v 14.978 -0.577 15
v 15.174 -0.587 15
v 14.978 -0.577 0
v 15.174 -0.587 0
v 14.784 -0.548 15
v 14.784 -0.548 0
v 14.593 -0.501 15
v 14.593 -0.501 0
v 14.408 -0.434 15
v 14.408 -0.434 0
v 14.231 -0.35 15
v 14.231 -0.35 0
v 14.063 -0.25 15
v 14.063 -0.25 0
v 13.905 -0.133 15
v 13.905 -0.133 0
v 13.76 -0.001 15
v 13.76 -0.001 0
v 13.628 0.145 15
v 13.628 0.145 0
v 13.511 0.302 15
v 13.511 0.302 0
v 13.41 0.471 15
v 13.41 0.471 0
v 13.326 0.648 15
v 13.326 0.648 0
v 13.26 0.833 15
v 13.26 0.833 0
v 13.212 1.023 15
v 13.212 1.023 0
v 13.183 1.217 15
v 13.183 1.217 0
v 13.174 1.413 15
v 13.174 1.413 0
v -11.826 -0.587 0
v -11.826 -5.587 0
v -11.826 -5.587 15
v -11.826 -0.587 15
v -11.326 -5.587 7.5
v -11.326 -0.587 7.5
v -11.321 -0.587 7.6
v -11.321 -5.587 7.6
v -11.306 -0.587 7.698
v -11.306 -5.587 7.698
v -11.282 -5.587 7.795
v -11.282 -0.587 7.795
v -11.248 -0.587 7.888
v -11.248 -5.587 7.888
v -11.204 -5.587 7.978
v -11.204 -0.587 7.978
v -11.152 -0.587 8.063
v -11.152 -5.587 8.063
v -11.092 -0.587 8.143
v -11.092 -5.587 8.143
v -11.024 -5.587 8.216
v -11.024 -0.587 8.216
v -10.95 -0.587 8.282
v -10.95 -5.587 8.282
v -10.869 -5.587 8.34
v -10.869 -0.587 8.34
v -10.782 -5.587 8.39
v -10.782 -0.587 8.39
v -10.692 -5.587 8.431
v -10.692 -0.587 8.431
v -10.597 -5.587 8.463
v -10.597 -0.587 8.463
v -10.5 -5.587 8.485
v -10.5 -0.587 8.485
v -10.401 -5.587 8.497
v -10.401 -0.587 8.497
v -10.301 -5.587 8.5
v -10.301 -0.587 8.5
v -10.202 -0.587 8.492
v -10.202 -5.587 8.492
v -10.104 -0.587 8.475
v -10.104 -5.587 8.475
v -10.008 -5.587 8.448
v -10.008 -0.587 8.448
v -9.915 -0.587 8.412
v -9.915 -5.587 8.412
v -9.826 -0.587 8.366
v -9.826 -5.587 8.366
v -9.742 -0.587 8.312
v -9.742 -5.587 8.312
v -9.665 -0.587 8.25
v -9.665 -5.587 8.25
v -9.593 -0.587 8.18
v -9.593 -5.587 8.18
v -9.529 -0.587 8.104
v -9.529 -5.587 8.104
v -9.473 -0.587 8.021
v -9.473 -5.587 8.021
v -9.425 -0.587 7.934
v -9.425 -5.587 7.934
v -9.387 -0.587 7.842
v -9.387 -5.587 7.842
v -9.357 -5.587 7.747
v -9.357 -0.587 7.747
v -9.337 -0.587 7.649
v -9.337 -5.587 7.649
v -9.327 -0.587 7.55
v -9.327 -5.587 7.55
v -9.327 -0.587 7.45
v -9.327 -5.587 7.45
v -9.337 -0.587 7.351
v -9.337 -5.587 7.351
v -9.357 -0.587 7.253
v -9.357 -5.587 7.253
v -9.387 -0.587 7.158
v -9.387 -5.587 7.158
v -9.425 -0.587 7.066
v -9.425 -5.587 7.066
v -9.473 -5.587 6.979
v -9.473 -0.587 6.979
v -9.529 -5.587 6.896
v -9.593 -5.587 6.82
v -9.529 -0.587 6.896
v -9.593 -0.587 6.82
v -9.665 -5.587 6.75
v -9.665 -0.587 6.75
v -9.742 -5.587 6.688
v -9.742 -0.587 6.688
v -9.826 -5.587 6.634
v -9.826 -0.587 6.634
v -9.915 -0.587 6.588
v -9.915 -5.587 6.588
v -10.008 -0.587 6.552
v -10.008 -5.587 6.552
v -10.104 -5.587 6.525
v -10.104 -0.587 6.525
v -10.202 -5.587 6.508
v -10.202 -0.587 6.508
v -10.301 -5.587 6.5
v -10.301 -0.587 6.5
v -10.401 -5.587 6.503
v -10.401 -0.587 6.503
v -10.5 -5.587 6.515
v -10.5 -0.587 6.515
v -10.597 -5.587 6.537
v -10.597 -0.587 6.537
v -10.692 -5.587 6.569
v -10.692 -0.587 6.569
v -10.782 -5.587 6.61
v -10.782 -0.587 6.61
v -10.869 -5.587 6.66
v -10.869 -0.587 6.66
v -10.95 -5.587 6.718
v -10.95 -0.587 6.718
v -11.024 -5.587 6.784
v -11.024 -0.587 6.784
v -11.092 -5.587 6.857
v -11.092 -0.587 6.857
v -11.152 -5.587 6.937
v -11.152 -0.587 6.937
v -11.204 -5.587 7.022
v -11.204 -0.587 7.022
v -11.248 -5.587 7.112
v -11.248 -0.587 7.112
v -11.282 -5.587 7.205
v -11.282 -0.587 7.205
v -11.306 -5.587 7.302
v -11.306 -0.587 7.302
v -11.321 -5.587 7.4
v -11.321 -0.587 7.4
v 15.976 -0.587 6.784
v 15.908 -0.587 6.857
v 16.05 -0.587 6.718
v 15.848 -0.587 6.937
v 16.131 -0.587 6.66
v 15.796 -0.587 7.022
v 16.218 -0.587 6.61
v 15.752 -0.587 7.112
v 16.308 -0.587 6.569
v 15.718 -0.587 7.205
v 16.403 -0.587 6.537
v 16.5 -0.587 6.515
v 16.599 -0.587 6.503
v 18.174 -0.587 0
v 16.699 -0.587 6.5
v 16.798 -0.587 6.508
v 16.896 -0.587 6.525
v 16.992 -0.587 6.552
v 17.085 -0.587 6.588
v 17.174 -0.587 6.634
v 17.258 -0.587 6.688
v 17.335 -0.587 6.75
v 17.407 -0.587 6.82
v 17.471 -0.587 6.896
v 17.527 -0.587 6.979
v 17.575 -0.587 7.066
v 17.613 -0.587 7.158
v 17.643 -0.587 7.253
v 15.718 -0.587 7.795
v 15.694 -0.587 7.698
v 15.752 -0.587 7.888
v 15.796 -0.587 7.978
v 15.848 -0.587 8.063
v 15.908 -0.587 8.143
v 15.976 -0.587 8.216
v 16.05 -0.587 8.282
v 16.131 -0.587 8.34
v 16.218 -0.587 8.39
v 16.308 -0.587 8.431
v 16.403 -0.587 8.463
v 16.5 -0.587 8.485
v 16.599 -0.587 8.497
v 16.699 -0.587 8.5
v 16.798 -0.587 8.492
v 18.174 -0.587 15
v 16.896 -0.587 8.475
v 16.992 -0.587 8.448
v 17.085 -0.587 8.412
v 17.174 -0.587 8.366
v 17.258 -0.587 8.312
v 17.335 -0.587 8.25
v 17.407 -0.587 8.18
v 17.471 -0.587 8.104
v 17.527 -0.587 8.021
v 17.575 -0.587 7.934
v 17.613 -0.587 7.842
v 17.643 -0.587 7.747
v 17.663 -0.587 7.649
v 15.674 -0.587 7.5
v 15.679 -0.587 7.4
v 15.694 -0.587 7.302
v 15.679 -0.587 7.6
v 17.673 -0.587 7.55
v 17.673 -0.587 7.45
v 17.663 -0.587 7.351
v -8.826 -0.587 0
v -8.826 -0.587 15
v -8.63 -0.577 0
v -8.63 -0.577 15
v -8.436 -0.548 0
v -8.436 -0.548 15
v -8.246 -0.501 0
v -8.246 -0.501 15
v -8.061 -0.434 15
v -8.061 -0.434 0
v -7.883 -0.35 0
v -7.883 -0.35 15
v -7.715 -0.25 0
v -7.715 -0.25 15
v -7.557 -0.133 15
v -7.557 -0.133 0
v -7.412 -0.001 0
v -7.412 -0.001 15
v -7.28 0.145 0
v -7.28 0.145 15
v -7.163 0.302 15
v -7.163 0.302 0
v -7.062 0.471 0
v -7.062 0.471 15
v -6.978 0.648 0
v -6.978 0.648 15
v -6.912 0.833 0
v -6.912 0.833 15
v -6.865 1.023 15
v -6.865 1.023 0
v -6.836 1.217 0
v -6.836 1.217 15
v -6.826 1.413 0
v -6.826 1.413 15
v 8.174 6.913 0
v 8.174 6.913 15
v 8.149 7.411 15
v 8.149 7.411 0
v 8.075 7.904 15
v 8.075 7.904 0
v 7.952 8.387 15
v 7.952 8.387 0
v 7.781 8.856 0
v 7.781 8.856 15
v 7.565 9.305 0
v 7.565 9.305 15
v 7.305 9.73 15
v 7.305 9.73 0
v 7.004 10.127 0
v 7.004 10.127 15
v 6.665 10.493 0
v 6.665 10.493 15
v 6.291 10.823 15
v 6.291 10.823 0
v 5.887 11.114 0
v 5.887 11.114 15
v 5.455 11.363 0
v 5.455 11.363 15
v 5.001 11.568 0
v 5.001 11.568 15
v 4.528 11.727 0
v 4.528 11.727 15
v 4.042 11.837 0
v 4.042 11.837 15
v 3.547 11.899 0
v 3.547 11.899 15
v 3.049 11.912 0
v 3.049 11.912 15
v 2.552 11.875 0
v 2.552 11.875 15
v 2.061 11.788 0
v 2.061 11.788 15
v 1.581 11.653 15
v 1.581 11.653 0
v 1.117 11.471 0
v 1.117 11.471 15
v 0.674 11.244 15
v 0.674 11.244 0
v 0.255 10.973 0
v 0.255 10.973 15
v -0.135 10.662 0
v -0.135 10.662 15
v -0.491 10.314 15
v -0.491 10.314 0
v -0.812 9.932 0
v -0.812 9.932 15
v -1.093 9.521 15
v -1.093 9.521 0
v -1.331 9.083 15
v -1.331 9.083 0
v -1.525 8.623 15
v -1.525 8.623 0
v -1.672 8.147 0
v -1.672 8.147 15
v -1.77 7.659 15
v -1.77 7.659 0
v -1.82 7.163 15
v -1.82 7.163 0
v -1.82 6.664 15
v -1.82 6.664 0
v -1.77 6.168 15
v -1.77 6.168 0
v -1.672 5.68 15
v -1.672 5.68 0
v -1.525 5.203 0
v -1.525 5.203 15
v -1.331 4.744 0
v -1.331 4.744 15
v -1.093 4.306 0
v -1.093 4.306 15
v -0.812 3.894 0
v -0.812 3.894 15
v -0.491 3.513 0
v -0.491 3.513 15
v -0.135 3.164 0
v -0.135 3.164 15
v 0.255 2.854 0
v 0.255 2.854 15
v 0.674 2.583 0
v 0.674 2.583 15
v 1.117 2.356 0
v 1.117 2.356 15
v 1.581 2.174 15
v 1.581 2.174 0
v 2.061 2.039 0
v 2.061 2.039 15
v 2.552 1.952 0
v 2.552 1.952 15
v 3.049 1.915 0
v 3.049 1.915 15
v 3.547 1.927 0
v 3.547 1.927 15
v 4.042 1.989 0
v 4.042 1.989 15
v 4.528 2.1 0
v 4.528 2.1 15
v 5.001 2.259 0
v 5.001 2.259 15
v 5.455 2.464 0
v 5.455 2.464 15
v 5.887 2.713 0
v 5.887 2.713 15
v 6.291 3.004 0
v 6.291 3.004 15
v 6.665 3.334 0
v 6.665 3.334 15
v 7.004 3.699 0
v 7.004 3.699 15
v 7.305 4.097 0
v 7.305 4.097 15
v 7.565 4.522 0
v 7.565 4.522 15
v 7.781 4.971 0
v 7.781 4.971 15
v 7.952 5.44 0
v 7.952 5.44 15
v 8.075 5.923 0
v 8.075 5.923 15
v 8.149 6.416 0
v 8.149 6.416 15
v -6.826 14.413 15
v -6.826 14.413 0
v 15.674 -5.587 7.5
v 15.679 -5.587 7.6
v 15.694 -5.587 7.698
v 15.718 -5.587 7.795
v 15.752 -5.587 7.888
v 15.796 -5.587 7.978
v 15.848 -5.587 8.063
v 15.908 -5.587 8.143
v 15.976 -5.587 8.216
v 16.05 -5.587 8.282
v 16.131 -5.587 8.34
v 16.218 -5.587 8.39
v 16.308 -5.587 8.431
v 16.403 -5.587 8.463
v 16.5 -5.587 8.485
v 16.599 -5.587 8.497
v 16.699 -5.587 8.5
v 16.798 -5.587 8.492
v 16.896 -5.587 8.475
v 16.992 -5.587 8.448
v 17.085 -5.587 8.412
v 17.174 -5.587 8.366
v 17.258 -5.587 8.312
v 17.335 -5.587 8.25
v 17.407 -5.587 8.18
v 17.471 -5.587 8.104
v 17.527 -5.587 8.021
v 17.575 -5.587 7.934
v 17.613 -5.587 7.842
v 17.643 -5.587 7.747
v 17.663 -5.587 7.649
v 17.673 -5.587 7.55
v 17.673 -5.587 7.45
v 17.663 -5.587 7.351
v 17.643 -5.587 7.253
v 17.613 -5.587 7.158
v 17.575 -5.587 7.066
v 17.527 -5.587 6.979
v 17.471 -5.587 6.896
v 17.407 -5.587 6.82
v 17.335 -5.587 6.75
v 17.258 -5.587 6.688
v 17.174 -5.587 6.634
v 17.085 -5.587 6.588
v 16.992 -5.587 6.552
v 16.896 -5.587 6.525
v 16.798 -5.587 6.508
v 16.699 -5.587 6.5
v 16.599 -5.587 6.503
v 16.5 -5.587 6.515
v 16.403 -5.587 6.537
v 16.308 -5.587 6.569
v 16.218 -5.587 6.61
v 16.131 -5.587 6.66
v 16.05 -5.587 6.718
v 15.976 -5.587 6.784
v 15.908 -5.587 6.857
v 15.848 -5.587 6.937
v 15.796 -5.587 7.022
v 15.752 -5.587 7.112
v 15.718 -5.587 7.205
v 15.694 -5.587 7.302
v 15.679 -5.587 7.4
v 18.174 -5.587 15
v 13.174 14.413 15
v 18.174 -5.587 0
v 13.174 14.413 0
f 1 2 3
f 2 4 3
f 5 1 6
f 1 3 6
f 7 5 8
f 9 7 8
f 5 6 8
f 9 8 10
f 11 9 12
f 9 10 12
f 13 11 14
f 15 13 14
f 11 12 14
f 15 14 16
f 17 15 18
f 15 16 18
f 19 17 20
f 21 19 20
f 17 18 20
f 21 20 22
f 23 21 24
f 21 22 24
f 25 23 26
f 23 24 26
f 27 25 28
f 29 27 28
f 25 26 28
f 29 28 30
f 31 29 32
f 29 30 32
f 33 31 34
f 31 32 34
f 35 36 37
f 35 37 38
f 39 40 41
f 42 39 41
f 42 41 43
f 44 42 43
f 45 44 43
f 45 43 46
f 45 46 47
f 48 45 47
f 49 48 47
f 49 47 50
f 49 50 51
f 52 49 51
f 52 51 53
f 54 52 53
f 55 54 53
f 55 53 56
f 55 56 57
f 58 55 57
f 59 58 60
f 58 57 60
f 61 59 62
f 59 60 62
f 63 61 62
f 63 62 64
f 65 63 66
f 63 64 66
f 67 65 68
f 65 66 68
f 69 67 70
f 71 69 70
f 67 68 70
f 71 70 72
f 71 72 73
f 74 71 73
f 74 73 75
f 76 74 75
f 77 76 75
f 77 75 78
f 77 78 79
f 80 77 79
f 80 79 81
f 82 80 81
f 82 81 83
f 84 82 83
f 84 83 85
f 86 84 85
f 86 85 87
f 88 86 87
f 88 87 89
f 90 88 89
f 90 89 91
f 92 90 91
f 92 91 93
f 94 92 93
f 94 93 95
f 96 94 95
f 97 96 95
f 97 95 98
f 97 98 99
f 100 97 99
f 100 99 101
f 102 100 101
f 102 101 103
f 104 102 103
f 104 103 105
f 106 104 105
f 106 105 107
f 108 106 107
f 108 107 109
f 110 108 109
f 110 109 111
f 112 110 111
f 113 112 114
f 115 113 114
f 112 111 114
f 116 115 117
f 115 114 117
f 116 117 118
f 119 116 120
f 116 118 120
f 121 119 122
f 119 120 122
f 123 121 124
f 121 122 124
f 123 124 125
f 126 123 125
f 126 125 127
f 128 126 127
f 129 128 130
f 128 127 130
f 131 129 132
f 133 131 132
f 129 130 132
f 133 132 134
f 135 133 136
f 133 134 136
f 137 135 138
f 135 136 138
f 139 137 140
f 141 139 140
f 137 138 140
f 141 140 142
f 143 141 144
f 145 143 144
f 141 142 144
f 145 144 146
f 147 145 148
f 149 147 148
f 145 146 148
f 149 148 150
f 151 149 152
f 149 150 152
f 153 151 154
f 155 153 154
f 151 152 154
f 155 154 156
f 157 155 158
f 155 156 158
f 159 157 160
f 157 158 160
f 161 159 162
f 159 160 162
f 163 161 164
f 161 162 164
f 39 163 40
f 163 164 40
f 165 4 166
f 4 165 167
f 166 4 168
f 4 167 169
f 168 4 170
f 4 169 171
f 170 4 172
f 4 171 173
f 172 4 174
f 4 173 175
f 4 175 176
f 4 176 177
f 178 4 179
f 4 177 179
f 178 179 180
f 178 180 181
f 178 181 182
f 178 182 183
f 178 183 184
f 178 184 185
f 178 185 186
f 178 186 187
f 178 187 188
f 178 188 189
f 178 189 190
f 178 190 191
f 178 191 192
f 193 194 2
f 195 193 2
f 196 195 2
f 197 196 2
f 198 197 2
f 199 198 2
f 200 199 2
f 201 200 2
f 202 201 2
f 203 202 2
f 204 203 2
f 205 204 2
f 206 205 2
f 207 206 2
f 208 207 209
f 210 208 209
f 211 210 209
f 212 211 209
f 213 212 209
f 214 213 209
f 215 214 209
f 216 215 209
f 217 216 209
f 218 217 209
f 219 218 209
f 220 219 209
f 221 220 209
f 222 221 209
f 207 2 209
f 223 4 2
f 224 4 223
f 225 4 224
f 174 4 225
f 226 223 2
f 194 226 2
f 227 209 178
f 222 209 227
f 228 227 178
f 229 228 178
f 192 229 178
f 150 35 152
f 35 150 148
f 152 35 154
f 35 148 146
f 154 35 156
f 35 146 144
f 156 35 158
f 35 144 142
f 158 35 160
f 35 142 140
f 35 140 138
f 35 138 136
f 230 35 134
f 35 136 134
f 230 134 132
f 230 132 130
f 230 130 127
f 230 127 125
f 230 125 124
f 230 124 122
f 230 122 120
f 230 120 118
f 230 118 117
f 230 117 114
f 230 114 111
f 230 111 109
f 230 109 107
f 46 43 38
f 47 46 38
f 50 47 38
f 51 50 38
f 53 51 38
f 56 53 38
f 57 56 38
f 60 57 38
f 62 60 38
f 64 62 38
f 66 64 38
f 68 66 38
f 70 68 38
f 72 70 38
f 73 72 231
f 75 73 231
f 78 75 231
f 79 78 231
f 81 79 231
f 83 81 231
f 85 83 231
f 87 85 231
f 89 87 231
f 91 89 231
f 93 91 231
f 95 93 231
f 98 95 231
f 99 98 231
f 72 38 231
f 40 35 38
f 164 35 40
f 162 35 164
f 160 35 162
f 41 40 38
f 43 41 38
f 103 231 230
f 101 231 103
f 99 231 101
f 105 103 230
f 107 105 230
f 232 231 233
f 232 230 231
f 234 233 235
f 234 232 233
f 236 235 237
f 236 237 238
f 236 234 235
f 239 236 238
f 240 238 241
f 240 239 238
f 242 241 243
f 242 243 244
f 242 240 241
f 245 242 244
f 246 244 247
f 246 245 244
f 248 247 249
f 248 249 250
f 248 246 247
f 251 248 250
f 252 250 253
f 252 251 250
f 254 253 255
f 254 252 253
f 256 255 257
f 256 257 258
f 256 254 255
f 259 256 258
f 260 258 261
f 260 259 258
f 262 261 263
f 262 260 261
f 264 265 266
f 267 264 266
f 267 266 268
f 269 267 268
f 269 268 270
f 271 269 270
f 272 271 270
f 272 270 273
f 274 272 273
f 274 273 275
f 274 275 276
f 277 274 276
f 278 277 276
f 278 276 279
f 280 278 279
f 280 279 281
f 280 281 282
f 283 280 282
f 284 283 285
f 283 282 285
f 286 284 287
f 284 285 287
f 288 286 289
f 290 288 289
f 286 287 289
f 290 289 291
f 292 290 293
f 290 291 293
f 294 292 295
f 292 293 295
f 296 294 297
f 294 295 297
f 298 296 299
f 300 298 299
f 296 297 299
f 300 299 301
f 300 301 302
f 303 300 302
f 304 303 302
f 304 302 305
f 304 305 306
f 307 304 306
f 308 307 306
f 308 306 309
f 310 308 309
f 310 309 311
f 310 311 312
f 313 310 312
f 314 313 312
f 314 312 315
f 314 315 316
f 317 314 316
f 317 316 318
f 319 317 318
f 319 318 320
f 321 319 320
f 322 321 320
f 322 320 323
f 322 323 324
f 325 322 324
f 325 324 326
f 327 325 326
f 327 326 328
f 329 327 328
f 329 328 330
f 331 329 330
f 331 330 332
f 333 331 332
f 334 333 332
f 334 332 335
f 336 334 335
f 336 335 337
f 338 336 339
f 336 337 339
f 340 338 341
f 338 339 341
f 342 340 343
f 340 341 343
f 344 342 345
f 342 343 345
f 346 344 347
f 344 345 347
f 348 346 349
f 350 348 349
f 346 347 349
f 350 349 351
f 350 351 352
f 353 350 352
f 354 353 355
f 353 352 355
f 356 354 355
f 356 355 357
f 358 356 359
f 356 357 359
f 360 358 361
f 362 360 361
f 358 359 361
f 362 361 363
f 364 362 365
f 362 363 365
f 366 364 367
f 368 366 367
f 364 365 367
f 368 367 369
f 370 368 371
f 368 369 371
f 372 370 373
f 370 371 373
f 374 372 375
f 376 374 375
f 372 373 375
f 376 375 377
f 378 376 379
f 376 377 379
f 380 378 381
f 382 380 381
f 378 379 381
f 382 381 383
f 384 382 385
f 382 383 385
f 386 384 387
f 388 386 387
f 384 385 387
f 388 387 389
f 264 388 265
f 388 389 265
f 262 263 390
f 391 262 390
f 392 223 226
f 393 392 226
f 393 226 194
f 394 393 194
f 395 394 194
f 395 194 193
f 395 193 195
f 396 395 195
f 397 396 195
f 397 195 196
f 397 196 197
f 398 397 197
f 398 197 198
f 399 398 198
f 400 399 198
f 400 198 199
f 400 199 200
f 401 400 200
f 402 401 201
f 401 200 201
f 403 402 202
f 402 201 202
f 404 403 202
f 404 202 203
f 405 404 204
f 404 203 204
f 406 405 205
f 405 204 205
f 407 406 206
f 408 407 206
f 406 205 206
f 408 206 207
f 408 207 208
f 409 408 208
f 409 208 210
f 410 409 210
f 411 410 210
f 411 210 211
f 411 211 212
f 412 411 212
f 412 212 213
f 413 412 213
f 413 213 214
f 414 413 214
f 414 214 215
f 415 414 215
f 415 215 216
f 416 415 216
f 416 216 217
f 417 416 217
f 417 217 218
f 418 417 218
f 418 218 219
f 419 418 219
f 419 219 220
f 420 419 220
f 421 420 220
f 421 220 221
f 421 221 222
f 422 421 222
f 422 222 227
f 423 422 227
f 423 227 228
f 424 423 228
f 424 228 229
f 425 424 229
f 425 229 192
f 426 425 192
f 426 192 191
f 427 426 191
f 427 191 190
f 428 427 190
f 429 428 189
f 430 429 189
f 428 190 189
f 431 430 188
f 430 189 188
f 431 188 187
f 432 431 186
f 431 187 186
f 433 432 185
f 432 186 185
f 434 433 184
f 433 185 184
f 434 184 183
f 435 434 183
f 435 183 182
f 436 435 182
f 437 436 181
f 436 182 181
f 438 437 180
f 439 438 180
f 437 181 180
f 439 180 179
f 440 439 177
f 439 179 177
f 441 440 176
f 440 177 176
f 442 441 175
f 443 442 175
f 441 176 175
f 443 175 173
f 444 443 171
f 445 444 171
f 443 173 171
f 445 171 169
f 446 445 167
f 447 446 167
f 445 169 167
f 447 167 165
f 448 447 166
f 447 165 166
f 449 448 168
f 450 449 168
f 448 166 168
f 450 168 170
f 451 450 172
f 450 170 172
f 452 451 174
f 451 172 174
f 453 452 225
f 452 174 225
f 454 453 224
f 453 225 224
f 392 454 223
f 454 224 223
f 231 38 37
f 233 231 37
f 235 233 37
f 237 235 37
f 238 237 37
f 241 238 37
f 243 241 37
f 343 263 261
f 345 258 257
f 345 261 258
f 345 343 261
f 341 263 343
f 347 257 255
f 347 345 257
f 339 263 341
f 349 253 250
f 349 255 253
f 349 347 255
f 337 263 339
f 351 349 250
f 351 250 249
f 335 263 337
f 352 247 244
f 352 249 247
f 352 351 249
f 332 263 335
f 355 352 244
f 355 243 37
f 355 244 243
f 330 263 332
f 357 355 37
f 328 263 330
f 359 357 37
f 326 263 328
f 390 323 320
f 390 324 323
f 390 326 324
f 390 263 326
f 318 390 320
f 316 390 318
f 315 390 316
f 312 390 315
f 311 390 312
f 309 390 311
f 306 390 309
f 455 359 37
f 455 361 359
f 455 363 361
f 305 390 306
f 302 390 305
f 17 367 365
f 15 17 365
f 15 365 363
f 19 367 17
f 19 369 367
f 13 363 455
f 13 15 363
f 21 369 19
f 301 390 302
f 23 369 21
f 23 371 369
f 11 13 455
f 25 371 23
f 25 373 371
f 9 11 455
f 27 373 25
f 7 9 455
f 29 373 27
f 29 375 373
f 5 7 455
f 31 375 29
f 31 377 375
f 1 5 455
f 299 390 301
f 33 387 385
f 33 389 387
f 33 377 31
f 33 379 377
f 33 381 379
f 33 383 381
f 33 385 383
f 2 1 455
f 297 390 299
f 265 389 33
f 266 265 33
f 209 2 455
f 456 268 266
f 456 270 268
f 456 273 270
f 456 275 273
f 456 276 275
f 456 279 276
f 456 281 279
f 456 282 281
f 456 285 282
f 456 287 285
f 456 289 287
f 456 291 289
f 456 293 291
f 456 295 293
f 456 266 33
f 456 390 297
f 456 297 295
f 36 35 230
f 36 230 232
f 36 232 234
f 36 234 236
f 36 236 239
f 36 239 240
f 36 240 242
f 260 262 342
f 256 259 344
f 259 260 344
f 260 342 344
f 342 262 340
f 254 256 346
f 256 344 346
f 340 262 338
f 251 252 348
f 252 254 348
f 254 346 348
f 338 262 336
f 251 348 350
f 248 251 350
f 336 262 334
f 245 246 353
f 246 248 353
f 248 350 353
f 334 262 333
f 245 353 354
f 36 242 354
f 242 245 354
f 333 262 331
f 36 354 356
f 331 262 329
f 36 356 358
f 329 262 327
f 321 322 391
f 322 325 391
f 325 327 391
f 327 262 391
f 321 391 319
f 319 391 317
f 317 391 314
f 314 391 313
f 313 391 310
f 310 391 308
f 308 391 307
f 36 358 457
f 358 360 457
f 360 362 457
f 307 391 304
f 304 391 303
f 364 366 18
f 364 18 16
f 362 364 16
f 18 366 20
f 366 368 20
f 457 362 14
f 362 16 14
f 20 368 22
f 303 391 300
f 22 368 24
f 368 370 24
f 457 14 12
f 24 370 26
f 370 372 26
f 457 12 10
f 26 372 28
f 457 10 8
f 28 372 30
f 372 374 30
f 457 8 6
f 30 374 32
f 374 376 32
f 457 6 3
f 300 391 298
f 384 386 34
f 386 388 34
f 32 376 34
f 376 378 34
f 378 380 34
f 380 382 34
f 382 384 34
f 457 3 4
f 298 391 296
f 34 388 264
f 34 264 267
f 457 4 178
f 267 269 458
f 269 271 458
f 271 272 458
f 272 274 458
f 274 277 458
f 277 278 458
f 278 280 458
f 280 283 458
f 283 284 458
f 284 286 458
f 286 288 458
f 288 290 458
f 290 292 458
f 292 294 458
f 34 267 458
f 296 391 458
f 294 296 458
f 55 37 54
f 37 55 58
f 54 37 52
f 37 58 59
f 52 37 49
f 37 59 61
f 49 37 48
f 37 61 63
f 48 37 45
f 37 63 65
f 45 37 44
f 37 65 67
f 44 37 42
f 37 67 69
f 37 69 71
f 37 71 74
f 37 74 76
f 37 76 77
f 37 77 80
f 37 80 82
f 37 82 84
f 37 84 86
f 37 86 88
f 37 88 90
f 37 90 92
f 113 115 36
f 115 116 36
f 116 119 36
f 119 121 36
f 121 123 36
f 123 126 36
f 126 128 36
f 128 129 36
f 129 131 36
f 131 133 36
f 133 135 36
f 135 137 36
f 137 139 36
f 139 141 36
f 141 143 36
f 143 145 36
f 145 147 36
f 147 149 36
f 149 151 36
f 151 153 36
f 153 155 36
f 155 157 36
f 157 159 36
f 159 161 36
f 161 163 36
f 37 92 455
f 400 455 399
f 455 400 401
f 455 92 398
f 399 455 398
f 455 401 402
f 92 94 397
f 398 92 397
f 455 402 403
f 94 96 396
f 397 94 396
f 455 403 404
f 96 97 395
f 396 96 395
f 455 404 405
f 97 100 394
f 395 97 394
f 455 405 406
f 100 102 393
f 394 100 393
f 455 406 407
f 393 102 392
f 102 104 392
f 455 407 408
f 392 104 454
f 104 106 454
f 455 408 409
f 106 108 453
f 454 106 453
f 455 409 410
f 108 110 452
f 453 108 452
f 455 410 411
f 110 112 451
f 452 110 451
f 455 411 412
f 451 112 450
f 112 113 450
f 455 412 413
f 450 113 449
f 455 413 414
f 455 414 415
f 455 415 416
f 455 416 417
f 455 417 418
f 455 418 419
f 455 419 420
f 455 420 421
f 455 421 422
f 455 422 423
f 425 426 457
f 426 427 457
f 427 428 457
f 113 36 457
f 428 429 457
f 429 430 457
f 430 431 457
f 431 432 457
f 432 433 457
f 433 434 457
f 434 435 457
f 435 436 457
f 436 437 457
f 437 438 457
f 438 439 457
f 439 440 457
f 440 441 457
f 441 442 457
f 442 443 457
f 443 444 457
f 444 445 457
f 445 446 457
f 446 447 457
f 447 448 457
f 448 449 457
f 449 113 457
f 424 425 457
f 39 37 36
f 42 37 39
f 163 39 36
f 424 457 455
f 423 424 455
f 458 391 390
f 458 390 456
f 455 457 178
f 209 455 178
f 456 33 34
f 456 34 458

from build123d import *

# Parameters (mm, degrees)
F0_W      = 30
F0_H      = 20
F1_DEPTH  = 15
F2_W      = 5
F2_H      = 15
F3_DEPTH  = 25
F4_W      = 5
F4_H      = 15
F5_DEPTH  = 25
F6_R      = 5
F7_DEPTH  = 15.001
F8_R      = 2
F10_R     = 1
F11_DEPTH = 25
F9_R      = 1
F12_DEPTH = 5.001


with BuildPart() as f1:
    # F0 (on Top) → F1 (new body)
    with BuildSketch(Plane.XY):
        with Locations((3.173804, 4.413379)):
            Rectangle(F0_W, F0_H)
    extrude(amount=F1_DEPTH)

    # F2 (on face) → F3 (cut)
    with BuildSketch(Plane.XY.offset(15)):
        with Locations((15.673804, 6.913379)):
            Rectangle(F2_W, F2_H)
    extrude(amount=-F3_DEPTH, mode=Mode.SUBTRACT)

    # F4 (on face) → F5 (cut)
    with BuildSketch(Plane.XY.offset(15)):
        with Locations((-9.326196, 6.913379)):
            Rectangle(F4_W, F4_H)
    extrude(amount=-F5_DEPTH, mode=Mode.SUBTRACT)

    # F6 (on face) → F7 (cut, through all)
    with BuildSketch(Plane.XY.offset(15)):
        with Locations((3.173804, 6.913379)):
            Circle(F6_R)
    extrude(amount=-F7_DEPTH, mode=Mode.SUBTRACT)

    # F8
    f8_edges = [f1.edges().sort_by_distance(p)[0] for p in [
        (-6.826196, -0.586621, 7.5),
        (13.173804, -0.586621, 7.5),
    ]]
    fillet(f8_edges, radius=F8_R)

    # F10 (on face) → F11 (cut)
    with BuildSketch(Plane(origin=(0, -0.586621, 0), x_dir=(-1, 0, 0), z_dir=(0, 1, 0))):
        with Locations((10.326196, 7.5)):
            Circle(F10_R)
    extrude(amount=-F11_DEPTH, mode=Mode.SUBTRACT)

    # F9 (on face) → F12 (cut, through all)
    with BuildSketch(Plane(origin=(0, -0.586621, 0), x_dir=(-1, 0, 0), z_dir=(0, 1, 0))):
        with Locations((-16.673804, 7.5)):
            Circle(F9_R)
    extrude(amount=-F12_DEPTH, mode=Mode.SUBTRACT)


solid = f1.part
